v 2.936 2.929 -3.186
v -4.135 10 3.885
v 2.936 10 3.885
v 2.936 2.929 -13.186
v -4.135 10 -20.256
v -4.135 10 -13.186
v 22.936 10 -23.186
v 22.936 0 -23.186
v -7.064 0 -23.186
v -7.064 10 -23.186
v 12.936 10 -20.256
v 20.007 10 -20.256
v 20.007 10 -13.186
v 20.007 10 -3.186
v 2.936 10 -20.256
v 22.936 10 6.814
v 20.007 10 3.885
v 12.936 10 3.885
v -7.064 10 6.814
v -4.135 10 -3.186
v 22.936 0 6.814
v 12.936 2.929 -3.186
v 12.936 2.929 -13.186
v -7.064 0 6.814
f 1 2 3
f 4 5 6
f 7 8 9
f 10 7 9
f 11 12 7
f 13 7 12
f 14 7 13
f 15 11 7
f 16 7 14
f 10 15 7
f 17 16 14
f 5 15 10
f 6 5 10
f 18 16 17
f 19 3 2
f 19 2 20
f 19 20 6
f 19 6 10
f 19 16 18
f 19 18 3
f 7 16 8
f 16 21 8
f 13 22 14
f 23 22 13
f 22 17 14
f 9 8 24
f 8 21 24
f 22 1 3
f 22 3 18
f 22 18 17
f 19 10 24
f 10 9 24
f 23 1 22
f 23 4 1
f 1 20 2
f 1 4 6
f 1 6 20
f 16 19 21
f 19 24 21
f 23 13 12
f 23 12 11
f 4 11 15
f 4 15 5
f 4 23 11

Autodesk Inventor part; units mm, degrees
ref_plane "YZ Plane" through (0, 0, 0) normal (1, 0, 0) x (0, 1, 0)
ref_plane "XZ Plane" through (0, 0, 0) normal (0, 1, 0) x (-1, 0, 0)
ref_plane "XY Plane" through (0, 0, 0) normal (0, 0, 1) x (1, 0, 0)
sketch "Sketch1" plane through (0, 0, 0) normal (0, 1, 0) x (-1, 0, 0)
  line L0 (7.064, 6.8143) -> (-22.936, 6.8143)
  line L1 (-22.936, 6.8143) -> (-22.936, -23.1857)
  line L2 (-22.936, -23.1857) -> (7.064, -23.1857)
  line L3 (7.064, -23.1857) -> (7.064, 6.8143)
  point P0 (0, 0)
  dimension "d0" = 30
  dimension "d1" = 30
extrude "Extrusion1" add sketch "Sketch1" along normal blind 10
sketch "Sketch2" plane through (0, 10, 0) normal (0, 1, 0) x (1, 0, 0)
  point P0 (0, 0)
sketch "Sketch3" plane through (0, 10, 0) normal (0, 1, 0) x (1, 0, 0)
  line L0 (2.936, 13.1857) -> (12.936, 13.1857)
  line L1 (12.936, 13.1857) -> (12.936, 3.1857)
  line L2 (12.936, 3.1857) -> (2.936, 3.1857)
  line L3 (2.936, 3.1857) -> (2.936, 13.1857)
  line L4 (22.936, -6.8143) -> (22.936, 23.1857) projected
  line L5 (-7.064, -6.8143) -> (22.936, -6.8143) projected
  point P0 (0, 0)
  dimension "d4" = 10
  dimension "d5" = 10
  dimension "d6" = 10
  dimension "d7" = 10
extrude "Extrusion2" cut sketch "Sketch3" against normal blind 7.0711
chamfer "Chamfer1" distance 7.0711 distance2 7.0711 1 edges at (7.936, 10, -13.1857) measured on face at (6.2693, 10, -19.8524)
chamfer "Chamfer2" distance 7.0711 distance2 7.0711 1 edges at (2.936, 10, -8.1857) measured on face at (-3.7307, 10, -9.8524)
chamfer "Chamfer3" distance 7.0711 distance2 7.0711 1 edges at (7.936, 10, -3.1857) measured on face at (9.6026, 10, 3.481)
chamfer "Chamfer4" distance 7.0711 distance2 7.0711 1 edges at (12.936, 10, -8.1857) measured on face at (19.6026, 10, -9.8524)
sketch "Sketch4" plane through (-4.1351, 10, -20.2568) normal (0.7071, 0.7071, 0) x (-0.7071, 0.7071, 0)
  circle A0 centre (-5, 12.0711) radius 5
  line L0 (0, 0) -> (0, 24.1421) projected
  point P0 (-9.995, 20.2568)
  dimension "d22" = 10
  dimension "d23" = 0
  dimension "d24" = 24.1421
  dimension "d25" = 12.0711
equation "\"d7\" = d6"
equation "\"d25\" = 0.5 * d24"
